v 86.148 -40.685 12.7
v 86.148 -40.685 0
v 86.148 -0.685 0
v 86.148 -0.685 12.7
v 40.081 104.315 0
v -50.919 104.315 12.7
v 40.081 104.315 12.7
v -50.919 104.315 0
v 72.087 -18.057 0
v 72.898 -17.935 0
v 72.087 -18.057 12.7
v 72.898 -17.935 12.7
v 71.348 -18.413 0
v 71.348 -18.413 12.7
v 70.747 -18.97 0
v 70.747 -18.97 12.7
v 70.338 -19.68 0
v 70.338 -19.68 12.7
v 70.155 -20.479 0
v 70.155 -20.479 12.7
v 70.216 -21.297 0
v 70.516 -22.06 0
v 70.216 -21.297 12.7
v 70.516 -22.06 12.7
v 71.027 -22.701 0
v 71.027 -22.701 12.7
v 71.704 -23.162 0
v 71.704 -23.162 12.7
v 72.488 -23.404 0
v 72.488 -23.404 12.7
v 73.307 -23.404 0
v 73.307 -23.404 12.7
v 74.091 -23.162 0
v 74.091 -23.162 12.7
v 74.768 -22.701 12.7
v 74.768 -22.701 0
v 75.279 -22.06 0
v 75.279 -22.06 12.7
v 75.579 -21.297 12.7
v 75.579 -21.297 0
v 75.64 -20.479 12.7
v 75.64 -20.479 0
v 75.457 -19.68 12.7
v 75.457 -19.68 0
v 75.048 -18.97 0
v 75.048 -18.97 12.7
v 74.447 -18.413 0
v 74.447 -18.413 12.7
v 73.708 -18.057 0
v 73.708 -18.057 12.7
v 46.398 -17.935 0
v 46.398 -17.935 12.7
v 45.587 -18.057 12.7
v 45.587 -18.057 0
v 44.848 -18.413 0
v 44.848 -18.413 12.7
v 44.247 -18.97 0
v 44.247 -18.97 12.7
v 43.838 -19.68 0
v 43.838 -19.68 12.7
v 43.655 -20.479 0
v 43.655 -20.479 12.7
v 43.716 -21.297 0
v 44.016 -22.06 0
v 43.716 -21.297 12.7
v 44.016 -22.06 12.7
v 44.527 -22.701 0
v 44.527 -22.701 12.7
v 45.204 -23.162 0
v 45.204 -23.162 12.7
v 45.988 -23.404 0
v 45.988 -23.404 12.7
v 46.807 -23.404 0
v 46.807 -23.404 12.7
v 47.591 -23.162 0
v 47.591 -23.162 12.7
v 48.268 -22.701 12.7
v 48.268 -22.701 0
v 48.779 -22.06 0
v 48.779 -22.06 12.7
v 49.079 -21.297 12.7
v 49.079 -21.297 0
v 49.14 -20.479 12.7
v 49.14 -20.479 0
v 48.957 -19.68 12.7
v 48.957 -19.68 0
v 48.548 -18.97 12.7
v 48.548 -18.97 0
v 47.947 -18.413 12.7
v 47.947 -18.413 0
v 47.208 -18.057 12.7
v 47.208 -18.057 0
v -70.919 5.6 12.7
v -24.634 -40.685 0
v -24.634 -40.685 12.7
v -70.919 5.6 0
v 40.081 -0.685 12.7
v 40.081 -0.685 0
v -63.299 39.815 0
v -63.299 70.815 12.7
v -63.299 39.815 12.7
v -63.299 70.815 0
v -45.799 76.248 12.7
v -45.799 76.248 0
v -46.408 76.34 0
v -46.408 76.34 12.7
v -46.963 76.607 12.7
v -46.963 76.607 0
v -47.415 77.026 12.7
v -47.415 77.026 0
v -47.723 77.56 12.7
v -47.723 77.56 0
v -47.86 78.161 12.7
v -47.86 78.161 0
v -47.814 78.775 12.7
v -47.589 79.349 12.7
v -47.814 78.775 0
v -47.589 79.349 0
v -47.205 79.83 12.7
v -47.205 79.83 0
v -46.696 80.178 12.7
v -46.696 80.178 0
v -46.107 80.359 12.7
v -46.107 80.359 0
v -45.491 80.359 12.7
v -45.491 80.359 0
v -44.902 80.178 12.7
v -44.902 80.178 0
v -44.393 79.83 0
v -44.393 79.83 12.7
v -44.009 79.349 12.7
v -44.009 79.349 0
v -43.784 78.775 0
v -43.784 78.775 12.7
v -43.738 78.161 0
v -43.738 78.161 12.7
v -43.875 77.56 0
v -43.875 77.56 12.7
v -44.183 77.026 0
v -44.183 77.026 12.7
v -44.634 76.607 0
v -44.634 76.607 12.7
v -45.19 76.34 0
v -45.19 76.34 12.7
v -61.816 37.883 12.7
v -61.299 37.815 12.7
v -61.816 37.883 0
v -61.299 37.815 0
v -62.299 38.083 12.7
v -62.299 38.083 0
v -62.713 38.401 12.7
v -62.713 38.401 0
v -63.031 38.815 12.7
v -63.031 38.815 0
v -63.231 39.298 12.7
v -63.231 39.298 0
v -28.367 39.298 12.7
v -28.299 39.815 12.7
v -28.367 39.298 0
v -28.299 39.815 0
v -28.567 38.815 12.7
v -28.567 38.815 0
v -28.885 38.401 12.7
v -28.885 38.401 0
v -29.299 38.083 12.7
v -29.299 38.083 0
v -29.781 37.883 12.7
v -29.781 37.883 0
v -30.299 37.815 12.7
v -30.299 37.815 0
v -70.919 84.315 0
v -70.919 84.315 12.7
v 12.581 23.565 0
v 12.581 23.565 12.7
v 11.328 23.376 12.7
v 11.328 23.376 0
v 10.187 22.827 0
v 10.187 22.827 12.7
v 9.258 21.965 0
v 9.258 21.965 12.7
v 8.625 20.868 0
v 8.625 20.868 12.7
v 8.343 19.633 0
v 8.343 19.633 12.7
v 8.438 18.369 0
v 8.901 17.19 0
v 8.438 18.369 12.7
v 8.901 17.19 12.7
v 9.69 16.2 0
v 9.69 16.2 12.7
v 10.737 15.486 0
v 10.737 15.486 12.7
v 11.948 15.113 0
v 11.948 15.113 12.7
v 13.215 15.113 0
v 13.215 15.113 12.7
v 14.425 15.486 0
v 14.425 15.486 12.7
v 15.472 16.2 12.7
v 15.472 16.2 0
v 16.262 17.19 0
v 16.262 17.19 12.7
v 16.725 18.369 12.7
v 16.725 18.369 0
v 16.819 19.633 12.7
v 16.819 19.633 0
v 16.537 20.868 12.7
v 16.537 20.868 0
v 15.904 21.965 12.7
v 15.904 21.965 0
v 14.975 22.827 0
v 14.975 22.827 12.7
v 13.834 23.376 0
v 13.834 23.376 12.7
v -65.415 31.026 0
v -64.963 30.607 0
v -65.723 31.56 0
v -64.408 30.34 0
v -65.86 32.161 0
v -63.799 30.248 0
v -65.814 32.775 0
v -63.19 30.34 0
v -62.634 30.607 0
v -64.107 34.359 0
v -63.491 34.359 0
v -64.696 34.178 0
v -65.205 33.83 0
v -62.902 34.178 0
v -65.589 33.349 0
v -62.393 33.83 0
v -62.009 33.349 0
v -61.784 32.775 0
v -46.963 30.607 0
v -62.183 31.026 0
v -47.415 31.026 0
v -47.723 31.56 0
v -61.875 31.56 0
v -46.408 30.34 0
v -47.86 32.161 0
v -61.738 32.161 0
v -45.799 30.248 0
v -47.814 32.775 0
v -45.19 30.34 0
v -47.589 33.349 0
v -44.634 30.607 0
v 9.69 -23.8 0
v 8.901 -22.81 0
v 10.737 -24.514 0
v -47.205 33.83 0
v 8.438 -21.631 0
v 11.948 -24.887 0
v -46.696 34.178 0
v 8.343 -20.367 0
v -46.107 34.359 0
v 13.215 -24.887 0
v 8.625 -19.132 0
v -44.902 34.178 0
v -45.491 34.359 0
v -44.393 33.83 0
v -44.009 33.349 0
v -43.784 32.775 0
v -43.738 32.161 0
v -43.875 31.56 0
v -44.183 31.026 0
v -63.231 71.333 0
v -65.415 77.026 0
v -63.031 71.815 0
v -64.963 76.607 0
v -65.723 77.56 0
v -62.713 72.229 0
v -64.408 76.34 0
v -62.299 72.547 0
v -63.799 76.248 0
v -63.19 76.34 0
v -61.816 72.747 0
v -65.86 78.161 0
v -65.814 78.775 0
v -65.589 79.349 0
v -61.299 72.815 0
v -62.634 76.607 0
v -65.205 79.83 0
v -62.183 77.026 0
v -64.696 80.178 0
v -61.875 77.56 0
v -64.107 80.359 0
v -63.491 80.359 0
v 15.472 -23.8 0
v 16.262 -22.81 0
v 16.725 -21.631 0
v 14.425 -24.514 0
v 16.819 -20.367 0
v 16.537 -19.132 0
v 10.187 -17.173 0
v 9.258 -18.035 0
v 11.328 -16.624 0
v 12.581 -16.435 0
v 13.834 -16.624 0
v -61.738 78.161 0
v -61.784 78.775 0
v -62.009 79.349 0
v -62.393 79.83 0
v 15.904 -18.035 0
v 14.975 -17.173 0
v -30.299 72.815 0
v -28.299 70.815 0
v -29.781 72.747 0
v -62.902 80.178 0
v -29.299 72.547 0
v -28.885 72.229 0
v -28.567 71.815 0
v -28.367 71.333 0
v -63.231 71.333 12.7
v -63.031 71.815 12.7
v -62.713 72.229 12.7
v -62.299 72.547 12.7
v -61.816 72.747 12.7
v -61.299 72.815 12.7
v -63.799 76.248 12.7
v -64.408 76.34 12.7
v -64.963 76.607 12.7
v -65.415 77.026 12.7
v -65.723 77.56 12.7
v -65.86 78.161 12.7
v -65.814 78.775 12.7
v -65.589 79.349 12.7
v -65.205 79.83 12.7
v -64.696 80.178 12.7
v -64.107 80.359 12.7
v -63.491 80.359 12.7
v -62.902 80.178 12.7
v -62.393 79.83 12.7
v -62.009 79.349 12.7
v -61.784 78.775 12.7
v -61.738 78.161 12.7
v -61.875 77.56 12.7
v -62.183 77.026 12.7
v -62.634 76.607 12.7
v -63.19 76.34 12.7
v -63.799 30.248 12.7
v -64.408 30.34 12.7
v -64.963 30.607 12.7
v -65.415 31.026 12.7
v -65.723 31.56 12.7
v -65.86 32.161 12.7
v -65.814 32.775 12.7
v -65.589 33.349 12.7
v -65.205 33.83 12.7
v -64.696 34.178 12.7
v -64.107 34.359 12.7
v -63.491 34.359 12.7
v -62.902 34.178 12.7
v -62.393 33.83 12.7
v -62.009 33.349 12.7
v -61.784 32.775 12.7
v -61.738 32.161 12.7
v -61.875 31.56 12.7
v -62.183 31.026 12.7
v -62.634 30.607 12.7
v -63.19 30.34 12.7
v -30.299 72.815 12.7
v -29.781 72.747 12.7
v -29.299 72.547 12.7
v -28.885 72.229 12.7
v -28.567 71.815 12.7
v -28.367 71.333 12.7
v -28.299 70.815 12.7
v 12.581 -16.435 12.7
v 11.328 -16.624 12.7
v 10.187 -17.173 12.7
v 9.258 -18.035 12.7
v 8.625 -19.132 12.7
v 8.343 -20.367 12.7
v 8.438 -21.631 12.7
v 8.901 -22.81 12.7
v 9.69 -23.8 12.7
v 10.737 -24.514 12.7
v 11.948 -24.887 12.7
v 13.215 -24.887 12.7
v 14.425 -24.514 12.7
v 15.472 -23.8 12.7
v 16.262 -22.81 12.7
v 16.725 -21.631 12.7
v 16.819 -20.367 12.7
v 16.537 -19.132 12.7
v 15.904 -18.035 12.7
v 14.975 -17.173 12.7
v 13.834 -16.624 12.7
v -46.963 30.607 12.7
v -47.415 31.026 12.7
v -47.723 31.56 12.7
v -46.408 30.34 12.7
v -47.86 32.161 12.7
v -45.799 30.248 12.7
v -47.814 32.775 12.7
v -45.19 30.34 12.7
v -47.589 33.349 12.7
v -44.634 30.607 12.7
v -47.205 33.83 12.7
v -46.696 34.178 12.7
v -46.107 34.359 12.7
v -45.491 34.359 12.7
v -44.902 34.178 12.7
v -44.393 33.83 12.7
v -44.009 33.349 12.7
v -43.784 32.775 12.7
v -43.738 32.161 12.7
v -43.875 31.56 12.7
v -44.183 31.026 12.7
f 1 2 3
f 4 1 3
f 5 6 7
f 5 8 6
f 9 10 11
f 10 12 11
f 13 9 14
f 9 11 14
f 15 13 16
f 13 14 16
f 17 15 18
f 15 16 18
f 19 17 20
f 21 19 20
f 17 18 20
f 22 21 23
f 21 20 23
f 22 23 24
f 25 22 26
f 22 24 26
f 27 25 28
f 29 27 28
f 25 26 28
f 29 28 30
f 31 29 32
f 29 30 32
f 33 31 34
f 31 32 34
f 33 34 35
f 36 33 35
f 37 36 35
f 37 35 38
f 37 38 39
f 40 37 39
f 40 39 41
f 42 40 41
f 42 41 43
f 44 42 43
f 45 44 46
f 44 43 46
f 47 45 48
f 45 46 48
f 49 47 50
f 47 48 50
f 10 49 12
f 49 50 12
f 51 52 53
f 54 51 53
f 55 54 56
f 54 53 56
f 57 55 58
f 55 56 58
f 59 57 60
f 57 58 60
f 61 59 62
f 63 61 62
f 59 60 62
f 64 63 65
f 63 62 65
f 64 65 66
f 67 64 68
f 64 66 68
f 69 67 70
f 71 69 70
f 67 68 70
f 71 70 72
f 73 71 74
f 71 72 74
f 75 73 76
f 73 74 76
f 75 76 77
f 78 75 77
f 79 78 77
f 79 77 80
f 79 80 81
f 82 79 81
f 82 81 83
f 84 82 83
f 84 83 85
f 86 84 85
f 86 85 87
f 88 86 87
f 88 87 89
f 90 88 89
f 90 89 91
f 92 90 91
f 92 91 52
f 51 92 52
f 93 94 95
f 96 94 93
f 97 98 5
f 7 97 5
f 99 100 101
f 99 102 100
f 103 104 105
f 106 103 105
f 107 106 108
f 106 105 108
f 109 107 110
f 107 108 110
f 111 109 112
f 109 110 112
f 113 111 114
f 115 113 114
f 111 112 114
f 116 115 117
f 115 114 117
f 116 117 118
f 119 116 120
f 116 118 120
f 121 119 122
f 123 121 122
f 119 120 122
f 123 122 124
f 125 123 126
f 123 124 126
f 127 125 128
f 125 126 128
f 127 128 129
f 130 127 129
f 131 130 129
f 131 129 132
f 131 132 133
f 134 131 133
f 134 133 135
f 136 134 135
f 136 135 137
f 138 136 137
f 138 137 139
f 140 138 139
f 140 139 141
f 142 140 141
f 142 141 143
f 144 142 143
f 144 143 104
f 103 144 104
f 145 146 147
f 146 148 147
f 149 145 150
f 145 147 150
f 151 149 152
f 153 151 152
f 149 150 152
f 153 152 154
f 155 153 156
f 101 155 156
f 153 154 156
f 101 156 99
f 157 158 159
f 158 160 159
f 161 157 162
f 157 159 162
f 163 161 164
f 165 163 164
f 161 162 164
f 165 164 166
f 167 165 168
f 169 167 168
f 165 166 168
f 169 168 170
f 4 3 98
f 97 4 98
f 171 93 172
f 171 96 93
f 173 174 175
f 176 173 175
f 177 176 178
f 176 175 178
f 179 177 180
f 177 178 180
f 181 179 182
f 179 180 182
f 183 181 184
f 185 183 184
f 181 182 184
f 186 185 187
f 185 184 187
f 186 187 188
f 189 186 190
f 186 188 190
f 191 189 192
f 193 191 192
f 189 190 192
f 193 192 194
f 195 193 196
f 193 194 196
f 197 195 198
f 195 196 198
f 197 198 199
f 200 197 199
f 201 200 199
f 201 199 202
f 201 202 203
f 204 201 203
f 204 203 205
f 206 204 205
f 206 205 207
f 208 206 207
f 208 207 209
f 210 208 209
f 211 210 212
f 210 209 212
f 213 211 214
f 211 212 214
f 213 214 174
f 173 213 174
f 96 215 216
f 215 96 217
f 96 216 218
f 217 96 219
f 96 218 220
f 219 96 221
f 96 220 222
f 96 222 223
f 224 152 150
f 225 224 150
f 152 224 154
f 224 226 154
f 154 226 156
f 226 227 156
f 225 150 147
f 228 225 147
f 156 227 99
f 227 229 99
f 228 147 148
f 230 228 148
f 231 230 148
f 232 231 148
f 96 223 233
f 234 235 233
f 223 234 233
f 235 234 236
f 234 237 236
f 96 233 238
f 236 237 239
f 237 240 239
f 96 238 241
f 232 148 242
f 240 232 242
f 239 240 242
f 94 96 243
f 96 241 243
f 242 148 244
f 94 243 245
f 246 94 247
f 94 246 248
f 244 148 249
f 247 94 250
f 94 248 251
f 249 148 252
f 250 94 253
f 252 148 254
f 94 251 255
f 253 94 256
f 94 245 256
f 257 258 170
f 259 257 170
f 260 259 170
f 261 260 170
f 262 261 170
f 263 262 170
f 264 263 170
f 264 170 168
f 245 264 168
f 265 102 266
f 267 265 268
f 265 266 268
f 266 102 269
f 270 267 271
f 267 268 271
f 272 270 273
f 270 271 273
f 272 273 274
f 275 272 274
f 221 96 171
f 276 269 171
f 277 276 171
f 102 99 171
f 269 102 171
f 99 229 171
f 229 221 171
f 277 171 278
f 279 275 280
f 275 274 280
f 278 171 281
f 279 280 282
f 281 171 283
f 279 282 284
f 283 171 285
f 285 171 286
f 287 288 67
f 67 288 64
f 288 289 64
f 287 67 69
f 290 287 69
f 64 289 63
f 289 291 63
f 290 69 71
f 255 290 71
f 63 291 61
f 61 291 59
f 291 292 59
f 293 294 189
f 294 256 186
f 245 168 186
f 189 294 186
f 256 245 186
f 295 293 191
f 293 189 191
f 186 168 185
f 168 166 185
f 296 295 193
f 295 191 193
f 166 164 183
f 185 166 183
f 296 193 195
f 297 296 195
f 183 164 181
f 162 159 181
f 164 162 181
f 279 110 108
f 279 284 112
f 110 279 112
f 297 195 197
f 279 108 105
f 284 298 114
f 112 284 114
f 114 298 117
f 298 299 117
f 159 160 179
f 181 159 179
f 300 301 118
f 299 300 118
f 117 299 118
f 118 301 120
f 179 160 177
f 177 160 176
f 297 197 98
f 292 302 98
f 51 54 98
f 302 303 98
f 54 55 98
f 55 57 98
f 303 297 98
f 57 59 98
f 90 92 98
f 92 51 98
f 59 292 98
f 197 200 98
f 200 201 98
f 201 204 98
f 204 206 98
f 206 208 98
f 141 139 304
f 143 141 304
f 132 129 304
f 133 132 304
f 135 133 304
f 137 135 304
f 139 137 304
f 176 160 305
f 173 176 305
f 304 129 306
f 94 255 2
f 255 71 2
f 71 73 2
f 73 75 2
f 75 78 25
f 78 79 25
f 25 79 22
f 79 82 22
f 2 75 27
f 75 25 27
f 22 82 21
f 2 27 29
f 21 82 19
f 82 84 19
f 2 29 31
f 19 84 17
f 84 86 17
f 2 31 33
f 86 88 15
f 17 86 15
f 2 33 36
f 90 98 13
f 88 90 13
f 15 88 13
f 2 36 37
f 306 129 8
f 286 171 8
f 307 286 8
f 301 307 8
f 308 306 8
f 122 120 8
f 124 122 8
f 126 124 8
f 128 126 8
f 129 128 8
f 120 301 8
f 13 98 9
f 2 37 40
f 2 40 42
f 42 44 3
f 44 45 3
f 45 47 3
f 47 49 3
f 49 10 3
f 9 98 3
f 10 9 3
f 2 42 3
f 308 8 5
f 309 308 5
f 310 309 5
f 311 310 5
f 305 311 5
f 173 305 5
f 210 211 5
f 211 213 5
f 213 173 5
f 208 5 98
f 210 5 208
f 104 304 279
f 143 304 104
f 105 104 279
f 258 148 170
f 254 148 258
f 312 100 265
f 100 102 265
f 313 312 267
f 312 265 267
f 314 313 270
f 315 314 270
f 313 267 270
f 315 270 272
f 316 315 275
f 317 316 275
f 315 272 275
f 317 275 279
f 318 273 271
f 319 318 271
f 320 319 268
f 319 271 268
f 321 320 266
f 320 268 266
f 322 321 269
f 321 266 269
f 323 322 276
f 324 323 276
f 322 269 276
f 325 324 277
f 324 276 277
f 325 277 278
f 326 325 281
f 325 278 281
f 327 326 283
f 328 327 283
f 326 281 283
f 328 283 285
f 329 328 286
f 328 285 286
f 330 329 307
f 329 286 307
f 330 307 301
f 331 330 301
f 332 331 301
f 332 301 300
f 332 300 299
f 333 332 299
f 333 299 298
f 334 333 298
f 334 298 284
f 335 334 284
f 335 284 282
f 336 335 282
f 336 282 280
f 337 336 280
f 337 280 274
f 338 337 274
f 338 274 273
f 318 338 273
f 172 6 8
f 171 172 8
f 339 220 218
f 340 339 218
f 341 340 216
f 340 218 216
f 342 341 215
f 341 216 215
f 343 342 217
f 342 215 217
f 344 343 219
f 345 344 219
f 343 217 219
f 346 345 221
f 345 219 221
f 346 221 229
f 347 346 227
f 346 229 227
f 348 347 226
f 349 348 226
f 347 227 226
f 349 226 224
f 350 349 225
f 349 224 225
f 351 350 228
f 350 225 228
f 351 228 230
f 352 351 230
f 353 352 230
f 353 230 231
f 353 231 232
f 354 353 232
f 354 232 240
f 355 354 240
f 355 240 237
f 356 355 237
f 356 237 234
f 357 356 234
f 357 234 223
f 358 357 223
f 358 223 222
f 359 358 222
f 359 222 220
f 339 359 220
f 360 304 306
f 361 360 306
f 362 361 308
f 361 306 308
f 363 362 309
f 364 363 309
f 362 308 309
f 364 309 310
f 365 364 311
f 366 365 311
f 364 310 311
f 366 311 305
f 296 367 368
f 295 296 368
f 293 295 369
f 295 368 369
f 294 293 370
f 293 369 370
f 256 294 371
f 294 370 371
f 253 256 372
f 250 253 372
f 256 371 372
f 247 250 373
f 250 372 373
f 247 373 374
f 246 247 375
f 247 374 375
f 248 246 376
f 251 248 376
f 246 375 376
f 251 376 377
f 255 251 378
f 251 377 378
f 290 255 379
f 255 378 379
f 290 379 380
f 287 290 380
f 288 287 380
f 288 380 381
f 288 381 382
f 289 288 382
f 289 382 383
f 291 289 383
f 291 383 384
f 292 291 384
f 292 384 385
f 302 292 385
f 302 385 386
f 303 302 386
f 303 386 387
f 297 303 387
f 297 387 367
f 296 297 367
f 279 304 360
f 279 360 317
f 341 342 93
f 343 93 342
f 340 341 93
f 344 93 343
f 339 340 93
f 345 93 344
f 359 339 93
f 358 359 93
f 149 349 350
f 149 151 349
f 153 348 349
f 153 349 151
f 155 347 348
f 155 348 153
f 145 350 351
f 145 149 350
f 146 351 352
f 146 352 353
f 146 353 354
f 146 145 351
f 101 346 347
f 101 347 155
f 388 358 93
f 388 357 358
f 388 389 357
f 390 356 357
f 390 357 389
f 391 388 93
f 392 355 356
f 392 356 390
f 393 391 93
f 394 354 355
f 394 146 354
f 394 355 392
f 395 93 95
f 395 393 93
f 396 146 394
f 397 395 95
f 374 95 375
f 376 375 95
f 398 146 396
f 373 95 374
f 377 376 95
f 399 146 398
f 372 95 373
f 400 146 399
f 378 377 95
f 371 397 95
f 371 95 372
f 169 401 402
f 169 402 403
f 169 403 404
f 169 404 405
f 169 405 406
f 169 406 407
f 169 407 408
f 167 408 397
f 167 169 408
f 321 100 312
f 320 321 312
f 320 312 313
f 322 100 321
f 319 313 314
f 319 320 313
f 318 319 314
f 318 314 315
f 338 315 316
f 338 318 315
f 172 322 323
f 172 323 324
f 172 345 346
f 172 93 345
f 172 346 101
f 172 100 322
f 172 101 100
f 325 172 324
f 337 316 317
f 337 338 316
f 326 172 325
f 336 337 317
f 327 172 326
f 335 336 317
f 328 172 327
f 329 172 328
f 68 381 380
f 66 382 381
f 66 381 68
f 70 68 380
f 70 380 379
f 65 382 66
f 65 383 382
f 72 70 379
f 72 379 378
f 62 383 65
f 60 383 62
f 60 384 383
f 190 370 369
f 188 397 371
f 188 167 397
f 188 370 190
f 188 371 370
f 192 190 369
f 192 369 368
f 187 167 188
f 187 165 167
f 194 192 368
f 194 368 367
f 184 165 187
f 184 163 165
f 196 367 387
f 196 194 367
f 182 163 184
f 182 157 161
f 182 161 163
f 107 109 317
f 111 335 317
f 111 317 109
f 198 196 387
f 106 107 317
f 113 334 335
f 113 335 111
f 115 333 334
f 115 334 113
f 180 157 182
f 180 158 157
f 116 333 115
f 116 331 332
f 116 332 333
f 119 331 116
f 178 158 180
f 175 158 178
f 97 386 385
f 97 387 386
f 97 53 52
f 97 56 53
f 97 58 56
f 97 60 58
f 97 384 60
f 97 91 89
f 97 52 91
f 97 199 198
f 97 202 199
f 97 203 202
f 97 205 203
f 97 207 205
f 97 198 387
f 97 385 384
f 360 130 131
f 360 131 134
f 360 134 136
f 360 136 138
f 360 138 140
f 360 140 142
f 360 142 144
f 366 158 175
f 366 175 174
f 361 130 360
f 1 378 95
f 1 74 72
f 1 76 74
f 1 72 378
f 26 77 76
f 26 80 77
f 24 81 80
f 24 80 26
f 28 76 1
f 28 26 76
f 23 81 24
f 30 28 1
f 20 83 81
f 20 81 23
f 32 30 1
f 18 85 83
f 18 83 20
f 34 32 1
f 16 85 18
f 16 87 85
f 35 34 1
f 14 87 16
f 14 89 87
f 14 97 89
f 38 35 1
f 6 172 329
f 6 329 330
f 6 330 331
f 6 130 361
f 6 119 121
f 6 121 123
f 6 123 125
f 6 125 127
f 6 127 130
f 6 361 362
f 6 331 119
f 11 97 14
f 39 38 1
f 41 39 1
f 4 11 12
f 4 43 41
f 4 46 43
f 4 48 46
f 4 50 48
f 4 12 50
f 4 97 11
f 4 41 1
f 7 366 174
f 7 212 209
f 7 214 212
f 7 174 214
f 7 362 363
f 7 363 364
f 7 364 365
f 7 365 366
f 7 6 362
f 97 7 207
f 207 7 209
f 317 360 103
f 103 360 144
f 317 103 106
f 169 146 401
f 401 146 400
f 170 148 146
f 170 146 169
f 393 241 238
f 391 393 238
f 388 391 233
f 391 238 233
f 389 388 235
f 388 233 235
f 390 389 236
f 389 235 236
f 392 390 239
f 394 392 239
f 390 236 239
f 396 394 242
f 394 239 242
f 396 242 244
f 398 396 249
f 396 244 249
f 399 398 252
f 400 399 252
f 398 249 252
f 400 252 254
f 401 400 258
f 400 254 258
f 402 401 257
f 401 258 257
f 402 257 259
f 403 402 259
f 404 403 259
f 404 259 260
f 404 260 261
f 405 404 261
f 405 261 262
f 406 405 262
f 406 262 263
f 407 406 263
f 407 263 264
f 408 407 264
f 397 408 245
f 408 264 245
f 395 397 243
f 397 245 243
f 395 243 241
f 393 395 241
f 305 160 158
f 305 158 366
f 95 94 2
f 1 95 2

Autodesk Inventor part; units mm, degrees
ref_plane "YZ Plane" through (0, 0, 0) normal (1, 0, 0) x (0, 1, 0)
ref_plane "XZ Plane" through (0, 0, 0) normal (0, 1, 0) x (-1, 0, 0)
ref_plane "XY Plane" through (0, 0, 0) normal (0, 0, 1) x (1, 0, 0)
sketch "Esboço1" plane through (0, 0, 0) normal (0, 0, 1) x (1, 0, 0)
  line L0 (-70.9188, 104.3152) -> (40.0812, 104.3152)
  line L1 (-70.9188, 5.5999) -> (-70.9188, 104.3152)
  line L2 (-24.6341, -40.6848) -> (86.1475, -40.6848)
  line L3 (86.1475, -40.6848) -> (86.1475, -0.6848)
  line L4 (86.1475, -0.6848) -> (40.0812, -0.6848)
  line L5 (40.0812, -0.6848) -> (40.0812, 104.3152)
  line L6 (-24.6341, -40.6848) -> (-70.9188, 5.5999)
  line L7 (-24.6341, -40.6848) -> (40.8222, -40.6848) construction
  point P0 (0, 0)
  dimension "d0" = 111
  dimension "d5" = 40
  dimension "d6" = 105
  dimension "d7" = 135
  dimension "d8" = 98.7154
  dimension "d11" = 157.0662
extrude "Extrusão1" add sketch "Esboço1" along normal blind 12.7
chamfer "Chanfro1" distance 20 angle 45 1 edges at (-70.9188, 104.3152, 6.35)
sketch "Esboço2" plane through (0, 0, 12.7) normal (0, 0, 1) x (1, 0, 0)
  circle A0 centre (-45.7988, 78.3152) radius 2.75 construction
  circle A1 centre (-63.7988, 78.3152) radius 2.75 construction
  circle A2 centre (-45.7988, 32.3152) radius 2.75 construction
  circle A3 centre (-63.7988, 32.3152) radius 2.75 construction
  point P0 (0, 0)
hole "Furo1" at (-45.7988, 78.3152, 12.7) at (-63.7988, 78.3152, 12.7) at (-45.7988, 32.3152, 12.7) at (-63.7988, 32.3152, 12.7) direction (0, 0, -1) diameter 4.134 end through all thread size "M5x0.8" class "6H" standard "ISO Metric profile"
sketch "Esboço3" plane through (0, 0, 0) normal (0, 0, -1) x (-1, 0, 0)
  line L0 (30.2988, 72.8152) -> (61.2988, 72.8152)
  line L1 (63.2988, 70.8152) -> (63.2988, 39.8152)
  line L2 (61.2988, 37.8152) -> (30.2988, 37.8152)
  line L3 (28.2988, 39.8152) -> (28.2988, 70.8152)
  line L4 (28.2988, 72.8152) -> (63.2988, 37.8152) construction
  line L5 (63.2988, 72.8152) -> (28.2988, 37.8152) construction
  arc A0 (30.2988, 72.8152) -> (28.2988, 70.8152) centre (30.2988, 70.8152) ccw
  arc A1 (28.2988, 39.8152) -> (30.2988, 37.8152) centre (30.2988, 39.8152) ccw
  arc A2 (61.2988, 37.8152) -> (63.2988, 39.8152) centre (61.2988, 39.8152) ccw
  arc A3 (63.2988, 70.8152) -> (61.2988, 72.8152) centre (61.2988, 70.8152) ccw
  point P0 (0, 0)
  dimension "d22" = 35
  dimension "d23" = 35
  dimension "d24" = 2
extrude "Extrusão2" cut sketch "Esboço3" against normal through all
sketch "Esboço4" plane through (0, 0, 0) normal (0, 0, -1) x (-1, 0, 0)
  circle A0 centre (-12.5812, 19.3152) radius 4
  circle A1 centre (-12.5812, -20.6848) radius 4
  line L0 (-40.0812, 104.3152) -> (-40.0812, -0.6848) projected
  line L1 (-86.1475, -40.6848) -> (24.6341, -40.6848) projected
  point P0 (0, 0)
  point P1 (-12.5812, 19.3152)
  point P2 (-12.5812, -20.6848)
  dimension "d27" = 8
  dimension "d28" = 8
  dimension "d36" = 27.5
  dimension "d37" = 60
  dimension "d38" = 20
  dimension "d39" = 27.5
hole "Furo2" at (12.5812, 19.3152, 0) at (12.5812, -20.6848, 0) direction (0, 0, 1) diameter 8.5 end through all
sketch "Esboço5" plane through (0, 0, 0) normal (0, 0, -1) x (-1, 0, 0)
  line L0 (-86.1475, -16.2848) -> (-33.1475, -16.2848) construction
  line L1 (-86.1475, -25.0848) -> (-33.1475, -25.0848) construction
  line L2 (-59.6475, -16.2848) -> (-59.6475, -25.0848) construction
  line L3 (-33.1475, -16.2848) -> (-33.1475, -25.0848) construction
  line L4 (-86.1475, -0.6848) -> (-86.1475, -41.0283) construction
  line L5 (-46.3975, -16.2848) -> (-46.3975, -25.0848) construction
  line L6 (-72.8975, -16.2848) -> (-72.8975, -25.0848) construction
  line L7 (-33.1475, -20.6848) -> (-86.1475, -20.6848) construction
  line L8 (-86.1475, -0.6848) -> (-86.1475, -40.6848) projected
  circle A0 centre (-46.3975, -20.6848) radius 2.5 construction
  circle A1 centre (-72.8975, -20.6848) radius 2.5 construction
  point P0 (0, 0)
  dimension "d40" = 26.5
  dimension "d41" = 13.25
  dimension "d42" = 13.25
  dimension "d43" = 53
  dimension "d44" = 5
  dimension "d45" = 5
hole "Furo3" at (72.8975, -20.6848, 0) at (46.3975, -20.6848, 0) direction (0, 0, 1) diameter 5.5 end through all
equation "\"d41\" = 0.5 * d40"
equation "\"d42\" = d41"
properties part number "SUPORTE_MANCAL_TRASEIRO"
